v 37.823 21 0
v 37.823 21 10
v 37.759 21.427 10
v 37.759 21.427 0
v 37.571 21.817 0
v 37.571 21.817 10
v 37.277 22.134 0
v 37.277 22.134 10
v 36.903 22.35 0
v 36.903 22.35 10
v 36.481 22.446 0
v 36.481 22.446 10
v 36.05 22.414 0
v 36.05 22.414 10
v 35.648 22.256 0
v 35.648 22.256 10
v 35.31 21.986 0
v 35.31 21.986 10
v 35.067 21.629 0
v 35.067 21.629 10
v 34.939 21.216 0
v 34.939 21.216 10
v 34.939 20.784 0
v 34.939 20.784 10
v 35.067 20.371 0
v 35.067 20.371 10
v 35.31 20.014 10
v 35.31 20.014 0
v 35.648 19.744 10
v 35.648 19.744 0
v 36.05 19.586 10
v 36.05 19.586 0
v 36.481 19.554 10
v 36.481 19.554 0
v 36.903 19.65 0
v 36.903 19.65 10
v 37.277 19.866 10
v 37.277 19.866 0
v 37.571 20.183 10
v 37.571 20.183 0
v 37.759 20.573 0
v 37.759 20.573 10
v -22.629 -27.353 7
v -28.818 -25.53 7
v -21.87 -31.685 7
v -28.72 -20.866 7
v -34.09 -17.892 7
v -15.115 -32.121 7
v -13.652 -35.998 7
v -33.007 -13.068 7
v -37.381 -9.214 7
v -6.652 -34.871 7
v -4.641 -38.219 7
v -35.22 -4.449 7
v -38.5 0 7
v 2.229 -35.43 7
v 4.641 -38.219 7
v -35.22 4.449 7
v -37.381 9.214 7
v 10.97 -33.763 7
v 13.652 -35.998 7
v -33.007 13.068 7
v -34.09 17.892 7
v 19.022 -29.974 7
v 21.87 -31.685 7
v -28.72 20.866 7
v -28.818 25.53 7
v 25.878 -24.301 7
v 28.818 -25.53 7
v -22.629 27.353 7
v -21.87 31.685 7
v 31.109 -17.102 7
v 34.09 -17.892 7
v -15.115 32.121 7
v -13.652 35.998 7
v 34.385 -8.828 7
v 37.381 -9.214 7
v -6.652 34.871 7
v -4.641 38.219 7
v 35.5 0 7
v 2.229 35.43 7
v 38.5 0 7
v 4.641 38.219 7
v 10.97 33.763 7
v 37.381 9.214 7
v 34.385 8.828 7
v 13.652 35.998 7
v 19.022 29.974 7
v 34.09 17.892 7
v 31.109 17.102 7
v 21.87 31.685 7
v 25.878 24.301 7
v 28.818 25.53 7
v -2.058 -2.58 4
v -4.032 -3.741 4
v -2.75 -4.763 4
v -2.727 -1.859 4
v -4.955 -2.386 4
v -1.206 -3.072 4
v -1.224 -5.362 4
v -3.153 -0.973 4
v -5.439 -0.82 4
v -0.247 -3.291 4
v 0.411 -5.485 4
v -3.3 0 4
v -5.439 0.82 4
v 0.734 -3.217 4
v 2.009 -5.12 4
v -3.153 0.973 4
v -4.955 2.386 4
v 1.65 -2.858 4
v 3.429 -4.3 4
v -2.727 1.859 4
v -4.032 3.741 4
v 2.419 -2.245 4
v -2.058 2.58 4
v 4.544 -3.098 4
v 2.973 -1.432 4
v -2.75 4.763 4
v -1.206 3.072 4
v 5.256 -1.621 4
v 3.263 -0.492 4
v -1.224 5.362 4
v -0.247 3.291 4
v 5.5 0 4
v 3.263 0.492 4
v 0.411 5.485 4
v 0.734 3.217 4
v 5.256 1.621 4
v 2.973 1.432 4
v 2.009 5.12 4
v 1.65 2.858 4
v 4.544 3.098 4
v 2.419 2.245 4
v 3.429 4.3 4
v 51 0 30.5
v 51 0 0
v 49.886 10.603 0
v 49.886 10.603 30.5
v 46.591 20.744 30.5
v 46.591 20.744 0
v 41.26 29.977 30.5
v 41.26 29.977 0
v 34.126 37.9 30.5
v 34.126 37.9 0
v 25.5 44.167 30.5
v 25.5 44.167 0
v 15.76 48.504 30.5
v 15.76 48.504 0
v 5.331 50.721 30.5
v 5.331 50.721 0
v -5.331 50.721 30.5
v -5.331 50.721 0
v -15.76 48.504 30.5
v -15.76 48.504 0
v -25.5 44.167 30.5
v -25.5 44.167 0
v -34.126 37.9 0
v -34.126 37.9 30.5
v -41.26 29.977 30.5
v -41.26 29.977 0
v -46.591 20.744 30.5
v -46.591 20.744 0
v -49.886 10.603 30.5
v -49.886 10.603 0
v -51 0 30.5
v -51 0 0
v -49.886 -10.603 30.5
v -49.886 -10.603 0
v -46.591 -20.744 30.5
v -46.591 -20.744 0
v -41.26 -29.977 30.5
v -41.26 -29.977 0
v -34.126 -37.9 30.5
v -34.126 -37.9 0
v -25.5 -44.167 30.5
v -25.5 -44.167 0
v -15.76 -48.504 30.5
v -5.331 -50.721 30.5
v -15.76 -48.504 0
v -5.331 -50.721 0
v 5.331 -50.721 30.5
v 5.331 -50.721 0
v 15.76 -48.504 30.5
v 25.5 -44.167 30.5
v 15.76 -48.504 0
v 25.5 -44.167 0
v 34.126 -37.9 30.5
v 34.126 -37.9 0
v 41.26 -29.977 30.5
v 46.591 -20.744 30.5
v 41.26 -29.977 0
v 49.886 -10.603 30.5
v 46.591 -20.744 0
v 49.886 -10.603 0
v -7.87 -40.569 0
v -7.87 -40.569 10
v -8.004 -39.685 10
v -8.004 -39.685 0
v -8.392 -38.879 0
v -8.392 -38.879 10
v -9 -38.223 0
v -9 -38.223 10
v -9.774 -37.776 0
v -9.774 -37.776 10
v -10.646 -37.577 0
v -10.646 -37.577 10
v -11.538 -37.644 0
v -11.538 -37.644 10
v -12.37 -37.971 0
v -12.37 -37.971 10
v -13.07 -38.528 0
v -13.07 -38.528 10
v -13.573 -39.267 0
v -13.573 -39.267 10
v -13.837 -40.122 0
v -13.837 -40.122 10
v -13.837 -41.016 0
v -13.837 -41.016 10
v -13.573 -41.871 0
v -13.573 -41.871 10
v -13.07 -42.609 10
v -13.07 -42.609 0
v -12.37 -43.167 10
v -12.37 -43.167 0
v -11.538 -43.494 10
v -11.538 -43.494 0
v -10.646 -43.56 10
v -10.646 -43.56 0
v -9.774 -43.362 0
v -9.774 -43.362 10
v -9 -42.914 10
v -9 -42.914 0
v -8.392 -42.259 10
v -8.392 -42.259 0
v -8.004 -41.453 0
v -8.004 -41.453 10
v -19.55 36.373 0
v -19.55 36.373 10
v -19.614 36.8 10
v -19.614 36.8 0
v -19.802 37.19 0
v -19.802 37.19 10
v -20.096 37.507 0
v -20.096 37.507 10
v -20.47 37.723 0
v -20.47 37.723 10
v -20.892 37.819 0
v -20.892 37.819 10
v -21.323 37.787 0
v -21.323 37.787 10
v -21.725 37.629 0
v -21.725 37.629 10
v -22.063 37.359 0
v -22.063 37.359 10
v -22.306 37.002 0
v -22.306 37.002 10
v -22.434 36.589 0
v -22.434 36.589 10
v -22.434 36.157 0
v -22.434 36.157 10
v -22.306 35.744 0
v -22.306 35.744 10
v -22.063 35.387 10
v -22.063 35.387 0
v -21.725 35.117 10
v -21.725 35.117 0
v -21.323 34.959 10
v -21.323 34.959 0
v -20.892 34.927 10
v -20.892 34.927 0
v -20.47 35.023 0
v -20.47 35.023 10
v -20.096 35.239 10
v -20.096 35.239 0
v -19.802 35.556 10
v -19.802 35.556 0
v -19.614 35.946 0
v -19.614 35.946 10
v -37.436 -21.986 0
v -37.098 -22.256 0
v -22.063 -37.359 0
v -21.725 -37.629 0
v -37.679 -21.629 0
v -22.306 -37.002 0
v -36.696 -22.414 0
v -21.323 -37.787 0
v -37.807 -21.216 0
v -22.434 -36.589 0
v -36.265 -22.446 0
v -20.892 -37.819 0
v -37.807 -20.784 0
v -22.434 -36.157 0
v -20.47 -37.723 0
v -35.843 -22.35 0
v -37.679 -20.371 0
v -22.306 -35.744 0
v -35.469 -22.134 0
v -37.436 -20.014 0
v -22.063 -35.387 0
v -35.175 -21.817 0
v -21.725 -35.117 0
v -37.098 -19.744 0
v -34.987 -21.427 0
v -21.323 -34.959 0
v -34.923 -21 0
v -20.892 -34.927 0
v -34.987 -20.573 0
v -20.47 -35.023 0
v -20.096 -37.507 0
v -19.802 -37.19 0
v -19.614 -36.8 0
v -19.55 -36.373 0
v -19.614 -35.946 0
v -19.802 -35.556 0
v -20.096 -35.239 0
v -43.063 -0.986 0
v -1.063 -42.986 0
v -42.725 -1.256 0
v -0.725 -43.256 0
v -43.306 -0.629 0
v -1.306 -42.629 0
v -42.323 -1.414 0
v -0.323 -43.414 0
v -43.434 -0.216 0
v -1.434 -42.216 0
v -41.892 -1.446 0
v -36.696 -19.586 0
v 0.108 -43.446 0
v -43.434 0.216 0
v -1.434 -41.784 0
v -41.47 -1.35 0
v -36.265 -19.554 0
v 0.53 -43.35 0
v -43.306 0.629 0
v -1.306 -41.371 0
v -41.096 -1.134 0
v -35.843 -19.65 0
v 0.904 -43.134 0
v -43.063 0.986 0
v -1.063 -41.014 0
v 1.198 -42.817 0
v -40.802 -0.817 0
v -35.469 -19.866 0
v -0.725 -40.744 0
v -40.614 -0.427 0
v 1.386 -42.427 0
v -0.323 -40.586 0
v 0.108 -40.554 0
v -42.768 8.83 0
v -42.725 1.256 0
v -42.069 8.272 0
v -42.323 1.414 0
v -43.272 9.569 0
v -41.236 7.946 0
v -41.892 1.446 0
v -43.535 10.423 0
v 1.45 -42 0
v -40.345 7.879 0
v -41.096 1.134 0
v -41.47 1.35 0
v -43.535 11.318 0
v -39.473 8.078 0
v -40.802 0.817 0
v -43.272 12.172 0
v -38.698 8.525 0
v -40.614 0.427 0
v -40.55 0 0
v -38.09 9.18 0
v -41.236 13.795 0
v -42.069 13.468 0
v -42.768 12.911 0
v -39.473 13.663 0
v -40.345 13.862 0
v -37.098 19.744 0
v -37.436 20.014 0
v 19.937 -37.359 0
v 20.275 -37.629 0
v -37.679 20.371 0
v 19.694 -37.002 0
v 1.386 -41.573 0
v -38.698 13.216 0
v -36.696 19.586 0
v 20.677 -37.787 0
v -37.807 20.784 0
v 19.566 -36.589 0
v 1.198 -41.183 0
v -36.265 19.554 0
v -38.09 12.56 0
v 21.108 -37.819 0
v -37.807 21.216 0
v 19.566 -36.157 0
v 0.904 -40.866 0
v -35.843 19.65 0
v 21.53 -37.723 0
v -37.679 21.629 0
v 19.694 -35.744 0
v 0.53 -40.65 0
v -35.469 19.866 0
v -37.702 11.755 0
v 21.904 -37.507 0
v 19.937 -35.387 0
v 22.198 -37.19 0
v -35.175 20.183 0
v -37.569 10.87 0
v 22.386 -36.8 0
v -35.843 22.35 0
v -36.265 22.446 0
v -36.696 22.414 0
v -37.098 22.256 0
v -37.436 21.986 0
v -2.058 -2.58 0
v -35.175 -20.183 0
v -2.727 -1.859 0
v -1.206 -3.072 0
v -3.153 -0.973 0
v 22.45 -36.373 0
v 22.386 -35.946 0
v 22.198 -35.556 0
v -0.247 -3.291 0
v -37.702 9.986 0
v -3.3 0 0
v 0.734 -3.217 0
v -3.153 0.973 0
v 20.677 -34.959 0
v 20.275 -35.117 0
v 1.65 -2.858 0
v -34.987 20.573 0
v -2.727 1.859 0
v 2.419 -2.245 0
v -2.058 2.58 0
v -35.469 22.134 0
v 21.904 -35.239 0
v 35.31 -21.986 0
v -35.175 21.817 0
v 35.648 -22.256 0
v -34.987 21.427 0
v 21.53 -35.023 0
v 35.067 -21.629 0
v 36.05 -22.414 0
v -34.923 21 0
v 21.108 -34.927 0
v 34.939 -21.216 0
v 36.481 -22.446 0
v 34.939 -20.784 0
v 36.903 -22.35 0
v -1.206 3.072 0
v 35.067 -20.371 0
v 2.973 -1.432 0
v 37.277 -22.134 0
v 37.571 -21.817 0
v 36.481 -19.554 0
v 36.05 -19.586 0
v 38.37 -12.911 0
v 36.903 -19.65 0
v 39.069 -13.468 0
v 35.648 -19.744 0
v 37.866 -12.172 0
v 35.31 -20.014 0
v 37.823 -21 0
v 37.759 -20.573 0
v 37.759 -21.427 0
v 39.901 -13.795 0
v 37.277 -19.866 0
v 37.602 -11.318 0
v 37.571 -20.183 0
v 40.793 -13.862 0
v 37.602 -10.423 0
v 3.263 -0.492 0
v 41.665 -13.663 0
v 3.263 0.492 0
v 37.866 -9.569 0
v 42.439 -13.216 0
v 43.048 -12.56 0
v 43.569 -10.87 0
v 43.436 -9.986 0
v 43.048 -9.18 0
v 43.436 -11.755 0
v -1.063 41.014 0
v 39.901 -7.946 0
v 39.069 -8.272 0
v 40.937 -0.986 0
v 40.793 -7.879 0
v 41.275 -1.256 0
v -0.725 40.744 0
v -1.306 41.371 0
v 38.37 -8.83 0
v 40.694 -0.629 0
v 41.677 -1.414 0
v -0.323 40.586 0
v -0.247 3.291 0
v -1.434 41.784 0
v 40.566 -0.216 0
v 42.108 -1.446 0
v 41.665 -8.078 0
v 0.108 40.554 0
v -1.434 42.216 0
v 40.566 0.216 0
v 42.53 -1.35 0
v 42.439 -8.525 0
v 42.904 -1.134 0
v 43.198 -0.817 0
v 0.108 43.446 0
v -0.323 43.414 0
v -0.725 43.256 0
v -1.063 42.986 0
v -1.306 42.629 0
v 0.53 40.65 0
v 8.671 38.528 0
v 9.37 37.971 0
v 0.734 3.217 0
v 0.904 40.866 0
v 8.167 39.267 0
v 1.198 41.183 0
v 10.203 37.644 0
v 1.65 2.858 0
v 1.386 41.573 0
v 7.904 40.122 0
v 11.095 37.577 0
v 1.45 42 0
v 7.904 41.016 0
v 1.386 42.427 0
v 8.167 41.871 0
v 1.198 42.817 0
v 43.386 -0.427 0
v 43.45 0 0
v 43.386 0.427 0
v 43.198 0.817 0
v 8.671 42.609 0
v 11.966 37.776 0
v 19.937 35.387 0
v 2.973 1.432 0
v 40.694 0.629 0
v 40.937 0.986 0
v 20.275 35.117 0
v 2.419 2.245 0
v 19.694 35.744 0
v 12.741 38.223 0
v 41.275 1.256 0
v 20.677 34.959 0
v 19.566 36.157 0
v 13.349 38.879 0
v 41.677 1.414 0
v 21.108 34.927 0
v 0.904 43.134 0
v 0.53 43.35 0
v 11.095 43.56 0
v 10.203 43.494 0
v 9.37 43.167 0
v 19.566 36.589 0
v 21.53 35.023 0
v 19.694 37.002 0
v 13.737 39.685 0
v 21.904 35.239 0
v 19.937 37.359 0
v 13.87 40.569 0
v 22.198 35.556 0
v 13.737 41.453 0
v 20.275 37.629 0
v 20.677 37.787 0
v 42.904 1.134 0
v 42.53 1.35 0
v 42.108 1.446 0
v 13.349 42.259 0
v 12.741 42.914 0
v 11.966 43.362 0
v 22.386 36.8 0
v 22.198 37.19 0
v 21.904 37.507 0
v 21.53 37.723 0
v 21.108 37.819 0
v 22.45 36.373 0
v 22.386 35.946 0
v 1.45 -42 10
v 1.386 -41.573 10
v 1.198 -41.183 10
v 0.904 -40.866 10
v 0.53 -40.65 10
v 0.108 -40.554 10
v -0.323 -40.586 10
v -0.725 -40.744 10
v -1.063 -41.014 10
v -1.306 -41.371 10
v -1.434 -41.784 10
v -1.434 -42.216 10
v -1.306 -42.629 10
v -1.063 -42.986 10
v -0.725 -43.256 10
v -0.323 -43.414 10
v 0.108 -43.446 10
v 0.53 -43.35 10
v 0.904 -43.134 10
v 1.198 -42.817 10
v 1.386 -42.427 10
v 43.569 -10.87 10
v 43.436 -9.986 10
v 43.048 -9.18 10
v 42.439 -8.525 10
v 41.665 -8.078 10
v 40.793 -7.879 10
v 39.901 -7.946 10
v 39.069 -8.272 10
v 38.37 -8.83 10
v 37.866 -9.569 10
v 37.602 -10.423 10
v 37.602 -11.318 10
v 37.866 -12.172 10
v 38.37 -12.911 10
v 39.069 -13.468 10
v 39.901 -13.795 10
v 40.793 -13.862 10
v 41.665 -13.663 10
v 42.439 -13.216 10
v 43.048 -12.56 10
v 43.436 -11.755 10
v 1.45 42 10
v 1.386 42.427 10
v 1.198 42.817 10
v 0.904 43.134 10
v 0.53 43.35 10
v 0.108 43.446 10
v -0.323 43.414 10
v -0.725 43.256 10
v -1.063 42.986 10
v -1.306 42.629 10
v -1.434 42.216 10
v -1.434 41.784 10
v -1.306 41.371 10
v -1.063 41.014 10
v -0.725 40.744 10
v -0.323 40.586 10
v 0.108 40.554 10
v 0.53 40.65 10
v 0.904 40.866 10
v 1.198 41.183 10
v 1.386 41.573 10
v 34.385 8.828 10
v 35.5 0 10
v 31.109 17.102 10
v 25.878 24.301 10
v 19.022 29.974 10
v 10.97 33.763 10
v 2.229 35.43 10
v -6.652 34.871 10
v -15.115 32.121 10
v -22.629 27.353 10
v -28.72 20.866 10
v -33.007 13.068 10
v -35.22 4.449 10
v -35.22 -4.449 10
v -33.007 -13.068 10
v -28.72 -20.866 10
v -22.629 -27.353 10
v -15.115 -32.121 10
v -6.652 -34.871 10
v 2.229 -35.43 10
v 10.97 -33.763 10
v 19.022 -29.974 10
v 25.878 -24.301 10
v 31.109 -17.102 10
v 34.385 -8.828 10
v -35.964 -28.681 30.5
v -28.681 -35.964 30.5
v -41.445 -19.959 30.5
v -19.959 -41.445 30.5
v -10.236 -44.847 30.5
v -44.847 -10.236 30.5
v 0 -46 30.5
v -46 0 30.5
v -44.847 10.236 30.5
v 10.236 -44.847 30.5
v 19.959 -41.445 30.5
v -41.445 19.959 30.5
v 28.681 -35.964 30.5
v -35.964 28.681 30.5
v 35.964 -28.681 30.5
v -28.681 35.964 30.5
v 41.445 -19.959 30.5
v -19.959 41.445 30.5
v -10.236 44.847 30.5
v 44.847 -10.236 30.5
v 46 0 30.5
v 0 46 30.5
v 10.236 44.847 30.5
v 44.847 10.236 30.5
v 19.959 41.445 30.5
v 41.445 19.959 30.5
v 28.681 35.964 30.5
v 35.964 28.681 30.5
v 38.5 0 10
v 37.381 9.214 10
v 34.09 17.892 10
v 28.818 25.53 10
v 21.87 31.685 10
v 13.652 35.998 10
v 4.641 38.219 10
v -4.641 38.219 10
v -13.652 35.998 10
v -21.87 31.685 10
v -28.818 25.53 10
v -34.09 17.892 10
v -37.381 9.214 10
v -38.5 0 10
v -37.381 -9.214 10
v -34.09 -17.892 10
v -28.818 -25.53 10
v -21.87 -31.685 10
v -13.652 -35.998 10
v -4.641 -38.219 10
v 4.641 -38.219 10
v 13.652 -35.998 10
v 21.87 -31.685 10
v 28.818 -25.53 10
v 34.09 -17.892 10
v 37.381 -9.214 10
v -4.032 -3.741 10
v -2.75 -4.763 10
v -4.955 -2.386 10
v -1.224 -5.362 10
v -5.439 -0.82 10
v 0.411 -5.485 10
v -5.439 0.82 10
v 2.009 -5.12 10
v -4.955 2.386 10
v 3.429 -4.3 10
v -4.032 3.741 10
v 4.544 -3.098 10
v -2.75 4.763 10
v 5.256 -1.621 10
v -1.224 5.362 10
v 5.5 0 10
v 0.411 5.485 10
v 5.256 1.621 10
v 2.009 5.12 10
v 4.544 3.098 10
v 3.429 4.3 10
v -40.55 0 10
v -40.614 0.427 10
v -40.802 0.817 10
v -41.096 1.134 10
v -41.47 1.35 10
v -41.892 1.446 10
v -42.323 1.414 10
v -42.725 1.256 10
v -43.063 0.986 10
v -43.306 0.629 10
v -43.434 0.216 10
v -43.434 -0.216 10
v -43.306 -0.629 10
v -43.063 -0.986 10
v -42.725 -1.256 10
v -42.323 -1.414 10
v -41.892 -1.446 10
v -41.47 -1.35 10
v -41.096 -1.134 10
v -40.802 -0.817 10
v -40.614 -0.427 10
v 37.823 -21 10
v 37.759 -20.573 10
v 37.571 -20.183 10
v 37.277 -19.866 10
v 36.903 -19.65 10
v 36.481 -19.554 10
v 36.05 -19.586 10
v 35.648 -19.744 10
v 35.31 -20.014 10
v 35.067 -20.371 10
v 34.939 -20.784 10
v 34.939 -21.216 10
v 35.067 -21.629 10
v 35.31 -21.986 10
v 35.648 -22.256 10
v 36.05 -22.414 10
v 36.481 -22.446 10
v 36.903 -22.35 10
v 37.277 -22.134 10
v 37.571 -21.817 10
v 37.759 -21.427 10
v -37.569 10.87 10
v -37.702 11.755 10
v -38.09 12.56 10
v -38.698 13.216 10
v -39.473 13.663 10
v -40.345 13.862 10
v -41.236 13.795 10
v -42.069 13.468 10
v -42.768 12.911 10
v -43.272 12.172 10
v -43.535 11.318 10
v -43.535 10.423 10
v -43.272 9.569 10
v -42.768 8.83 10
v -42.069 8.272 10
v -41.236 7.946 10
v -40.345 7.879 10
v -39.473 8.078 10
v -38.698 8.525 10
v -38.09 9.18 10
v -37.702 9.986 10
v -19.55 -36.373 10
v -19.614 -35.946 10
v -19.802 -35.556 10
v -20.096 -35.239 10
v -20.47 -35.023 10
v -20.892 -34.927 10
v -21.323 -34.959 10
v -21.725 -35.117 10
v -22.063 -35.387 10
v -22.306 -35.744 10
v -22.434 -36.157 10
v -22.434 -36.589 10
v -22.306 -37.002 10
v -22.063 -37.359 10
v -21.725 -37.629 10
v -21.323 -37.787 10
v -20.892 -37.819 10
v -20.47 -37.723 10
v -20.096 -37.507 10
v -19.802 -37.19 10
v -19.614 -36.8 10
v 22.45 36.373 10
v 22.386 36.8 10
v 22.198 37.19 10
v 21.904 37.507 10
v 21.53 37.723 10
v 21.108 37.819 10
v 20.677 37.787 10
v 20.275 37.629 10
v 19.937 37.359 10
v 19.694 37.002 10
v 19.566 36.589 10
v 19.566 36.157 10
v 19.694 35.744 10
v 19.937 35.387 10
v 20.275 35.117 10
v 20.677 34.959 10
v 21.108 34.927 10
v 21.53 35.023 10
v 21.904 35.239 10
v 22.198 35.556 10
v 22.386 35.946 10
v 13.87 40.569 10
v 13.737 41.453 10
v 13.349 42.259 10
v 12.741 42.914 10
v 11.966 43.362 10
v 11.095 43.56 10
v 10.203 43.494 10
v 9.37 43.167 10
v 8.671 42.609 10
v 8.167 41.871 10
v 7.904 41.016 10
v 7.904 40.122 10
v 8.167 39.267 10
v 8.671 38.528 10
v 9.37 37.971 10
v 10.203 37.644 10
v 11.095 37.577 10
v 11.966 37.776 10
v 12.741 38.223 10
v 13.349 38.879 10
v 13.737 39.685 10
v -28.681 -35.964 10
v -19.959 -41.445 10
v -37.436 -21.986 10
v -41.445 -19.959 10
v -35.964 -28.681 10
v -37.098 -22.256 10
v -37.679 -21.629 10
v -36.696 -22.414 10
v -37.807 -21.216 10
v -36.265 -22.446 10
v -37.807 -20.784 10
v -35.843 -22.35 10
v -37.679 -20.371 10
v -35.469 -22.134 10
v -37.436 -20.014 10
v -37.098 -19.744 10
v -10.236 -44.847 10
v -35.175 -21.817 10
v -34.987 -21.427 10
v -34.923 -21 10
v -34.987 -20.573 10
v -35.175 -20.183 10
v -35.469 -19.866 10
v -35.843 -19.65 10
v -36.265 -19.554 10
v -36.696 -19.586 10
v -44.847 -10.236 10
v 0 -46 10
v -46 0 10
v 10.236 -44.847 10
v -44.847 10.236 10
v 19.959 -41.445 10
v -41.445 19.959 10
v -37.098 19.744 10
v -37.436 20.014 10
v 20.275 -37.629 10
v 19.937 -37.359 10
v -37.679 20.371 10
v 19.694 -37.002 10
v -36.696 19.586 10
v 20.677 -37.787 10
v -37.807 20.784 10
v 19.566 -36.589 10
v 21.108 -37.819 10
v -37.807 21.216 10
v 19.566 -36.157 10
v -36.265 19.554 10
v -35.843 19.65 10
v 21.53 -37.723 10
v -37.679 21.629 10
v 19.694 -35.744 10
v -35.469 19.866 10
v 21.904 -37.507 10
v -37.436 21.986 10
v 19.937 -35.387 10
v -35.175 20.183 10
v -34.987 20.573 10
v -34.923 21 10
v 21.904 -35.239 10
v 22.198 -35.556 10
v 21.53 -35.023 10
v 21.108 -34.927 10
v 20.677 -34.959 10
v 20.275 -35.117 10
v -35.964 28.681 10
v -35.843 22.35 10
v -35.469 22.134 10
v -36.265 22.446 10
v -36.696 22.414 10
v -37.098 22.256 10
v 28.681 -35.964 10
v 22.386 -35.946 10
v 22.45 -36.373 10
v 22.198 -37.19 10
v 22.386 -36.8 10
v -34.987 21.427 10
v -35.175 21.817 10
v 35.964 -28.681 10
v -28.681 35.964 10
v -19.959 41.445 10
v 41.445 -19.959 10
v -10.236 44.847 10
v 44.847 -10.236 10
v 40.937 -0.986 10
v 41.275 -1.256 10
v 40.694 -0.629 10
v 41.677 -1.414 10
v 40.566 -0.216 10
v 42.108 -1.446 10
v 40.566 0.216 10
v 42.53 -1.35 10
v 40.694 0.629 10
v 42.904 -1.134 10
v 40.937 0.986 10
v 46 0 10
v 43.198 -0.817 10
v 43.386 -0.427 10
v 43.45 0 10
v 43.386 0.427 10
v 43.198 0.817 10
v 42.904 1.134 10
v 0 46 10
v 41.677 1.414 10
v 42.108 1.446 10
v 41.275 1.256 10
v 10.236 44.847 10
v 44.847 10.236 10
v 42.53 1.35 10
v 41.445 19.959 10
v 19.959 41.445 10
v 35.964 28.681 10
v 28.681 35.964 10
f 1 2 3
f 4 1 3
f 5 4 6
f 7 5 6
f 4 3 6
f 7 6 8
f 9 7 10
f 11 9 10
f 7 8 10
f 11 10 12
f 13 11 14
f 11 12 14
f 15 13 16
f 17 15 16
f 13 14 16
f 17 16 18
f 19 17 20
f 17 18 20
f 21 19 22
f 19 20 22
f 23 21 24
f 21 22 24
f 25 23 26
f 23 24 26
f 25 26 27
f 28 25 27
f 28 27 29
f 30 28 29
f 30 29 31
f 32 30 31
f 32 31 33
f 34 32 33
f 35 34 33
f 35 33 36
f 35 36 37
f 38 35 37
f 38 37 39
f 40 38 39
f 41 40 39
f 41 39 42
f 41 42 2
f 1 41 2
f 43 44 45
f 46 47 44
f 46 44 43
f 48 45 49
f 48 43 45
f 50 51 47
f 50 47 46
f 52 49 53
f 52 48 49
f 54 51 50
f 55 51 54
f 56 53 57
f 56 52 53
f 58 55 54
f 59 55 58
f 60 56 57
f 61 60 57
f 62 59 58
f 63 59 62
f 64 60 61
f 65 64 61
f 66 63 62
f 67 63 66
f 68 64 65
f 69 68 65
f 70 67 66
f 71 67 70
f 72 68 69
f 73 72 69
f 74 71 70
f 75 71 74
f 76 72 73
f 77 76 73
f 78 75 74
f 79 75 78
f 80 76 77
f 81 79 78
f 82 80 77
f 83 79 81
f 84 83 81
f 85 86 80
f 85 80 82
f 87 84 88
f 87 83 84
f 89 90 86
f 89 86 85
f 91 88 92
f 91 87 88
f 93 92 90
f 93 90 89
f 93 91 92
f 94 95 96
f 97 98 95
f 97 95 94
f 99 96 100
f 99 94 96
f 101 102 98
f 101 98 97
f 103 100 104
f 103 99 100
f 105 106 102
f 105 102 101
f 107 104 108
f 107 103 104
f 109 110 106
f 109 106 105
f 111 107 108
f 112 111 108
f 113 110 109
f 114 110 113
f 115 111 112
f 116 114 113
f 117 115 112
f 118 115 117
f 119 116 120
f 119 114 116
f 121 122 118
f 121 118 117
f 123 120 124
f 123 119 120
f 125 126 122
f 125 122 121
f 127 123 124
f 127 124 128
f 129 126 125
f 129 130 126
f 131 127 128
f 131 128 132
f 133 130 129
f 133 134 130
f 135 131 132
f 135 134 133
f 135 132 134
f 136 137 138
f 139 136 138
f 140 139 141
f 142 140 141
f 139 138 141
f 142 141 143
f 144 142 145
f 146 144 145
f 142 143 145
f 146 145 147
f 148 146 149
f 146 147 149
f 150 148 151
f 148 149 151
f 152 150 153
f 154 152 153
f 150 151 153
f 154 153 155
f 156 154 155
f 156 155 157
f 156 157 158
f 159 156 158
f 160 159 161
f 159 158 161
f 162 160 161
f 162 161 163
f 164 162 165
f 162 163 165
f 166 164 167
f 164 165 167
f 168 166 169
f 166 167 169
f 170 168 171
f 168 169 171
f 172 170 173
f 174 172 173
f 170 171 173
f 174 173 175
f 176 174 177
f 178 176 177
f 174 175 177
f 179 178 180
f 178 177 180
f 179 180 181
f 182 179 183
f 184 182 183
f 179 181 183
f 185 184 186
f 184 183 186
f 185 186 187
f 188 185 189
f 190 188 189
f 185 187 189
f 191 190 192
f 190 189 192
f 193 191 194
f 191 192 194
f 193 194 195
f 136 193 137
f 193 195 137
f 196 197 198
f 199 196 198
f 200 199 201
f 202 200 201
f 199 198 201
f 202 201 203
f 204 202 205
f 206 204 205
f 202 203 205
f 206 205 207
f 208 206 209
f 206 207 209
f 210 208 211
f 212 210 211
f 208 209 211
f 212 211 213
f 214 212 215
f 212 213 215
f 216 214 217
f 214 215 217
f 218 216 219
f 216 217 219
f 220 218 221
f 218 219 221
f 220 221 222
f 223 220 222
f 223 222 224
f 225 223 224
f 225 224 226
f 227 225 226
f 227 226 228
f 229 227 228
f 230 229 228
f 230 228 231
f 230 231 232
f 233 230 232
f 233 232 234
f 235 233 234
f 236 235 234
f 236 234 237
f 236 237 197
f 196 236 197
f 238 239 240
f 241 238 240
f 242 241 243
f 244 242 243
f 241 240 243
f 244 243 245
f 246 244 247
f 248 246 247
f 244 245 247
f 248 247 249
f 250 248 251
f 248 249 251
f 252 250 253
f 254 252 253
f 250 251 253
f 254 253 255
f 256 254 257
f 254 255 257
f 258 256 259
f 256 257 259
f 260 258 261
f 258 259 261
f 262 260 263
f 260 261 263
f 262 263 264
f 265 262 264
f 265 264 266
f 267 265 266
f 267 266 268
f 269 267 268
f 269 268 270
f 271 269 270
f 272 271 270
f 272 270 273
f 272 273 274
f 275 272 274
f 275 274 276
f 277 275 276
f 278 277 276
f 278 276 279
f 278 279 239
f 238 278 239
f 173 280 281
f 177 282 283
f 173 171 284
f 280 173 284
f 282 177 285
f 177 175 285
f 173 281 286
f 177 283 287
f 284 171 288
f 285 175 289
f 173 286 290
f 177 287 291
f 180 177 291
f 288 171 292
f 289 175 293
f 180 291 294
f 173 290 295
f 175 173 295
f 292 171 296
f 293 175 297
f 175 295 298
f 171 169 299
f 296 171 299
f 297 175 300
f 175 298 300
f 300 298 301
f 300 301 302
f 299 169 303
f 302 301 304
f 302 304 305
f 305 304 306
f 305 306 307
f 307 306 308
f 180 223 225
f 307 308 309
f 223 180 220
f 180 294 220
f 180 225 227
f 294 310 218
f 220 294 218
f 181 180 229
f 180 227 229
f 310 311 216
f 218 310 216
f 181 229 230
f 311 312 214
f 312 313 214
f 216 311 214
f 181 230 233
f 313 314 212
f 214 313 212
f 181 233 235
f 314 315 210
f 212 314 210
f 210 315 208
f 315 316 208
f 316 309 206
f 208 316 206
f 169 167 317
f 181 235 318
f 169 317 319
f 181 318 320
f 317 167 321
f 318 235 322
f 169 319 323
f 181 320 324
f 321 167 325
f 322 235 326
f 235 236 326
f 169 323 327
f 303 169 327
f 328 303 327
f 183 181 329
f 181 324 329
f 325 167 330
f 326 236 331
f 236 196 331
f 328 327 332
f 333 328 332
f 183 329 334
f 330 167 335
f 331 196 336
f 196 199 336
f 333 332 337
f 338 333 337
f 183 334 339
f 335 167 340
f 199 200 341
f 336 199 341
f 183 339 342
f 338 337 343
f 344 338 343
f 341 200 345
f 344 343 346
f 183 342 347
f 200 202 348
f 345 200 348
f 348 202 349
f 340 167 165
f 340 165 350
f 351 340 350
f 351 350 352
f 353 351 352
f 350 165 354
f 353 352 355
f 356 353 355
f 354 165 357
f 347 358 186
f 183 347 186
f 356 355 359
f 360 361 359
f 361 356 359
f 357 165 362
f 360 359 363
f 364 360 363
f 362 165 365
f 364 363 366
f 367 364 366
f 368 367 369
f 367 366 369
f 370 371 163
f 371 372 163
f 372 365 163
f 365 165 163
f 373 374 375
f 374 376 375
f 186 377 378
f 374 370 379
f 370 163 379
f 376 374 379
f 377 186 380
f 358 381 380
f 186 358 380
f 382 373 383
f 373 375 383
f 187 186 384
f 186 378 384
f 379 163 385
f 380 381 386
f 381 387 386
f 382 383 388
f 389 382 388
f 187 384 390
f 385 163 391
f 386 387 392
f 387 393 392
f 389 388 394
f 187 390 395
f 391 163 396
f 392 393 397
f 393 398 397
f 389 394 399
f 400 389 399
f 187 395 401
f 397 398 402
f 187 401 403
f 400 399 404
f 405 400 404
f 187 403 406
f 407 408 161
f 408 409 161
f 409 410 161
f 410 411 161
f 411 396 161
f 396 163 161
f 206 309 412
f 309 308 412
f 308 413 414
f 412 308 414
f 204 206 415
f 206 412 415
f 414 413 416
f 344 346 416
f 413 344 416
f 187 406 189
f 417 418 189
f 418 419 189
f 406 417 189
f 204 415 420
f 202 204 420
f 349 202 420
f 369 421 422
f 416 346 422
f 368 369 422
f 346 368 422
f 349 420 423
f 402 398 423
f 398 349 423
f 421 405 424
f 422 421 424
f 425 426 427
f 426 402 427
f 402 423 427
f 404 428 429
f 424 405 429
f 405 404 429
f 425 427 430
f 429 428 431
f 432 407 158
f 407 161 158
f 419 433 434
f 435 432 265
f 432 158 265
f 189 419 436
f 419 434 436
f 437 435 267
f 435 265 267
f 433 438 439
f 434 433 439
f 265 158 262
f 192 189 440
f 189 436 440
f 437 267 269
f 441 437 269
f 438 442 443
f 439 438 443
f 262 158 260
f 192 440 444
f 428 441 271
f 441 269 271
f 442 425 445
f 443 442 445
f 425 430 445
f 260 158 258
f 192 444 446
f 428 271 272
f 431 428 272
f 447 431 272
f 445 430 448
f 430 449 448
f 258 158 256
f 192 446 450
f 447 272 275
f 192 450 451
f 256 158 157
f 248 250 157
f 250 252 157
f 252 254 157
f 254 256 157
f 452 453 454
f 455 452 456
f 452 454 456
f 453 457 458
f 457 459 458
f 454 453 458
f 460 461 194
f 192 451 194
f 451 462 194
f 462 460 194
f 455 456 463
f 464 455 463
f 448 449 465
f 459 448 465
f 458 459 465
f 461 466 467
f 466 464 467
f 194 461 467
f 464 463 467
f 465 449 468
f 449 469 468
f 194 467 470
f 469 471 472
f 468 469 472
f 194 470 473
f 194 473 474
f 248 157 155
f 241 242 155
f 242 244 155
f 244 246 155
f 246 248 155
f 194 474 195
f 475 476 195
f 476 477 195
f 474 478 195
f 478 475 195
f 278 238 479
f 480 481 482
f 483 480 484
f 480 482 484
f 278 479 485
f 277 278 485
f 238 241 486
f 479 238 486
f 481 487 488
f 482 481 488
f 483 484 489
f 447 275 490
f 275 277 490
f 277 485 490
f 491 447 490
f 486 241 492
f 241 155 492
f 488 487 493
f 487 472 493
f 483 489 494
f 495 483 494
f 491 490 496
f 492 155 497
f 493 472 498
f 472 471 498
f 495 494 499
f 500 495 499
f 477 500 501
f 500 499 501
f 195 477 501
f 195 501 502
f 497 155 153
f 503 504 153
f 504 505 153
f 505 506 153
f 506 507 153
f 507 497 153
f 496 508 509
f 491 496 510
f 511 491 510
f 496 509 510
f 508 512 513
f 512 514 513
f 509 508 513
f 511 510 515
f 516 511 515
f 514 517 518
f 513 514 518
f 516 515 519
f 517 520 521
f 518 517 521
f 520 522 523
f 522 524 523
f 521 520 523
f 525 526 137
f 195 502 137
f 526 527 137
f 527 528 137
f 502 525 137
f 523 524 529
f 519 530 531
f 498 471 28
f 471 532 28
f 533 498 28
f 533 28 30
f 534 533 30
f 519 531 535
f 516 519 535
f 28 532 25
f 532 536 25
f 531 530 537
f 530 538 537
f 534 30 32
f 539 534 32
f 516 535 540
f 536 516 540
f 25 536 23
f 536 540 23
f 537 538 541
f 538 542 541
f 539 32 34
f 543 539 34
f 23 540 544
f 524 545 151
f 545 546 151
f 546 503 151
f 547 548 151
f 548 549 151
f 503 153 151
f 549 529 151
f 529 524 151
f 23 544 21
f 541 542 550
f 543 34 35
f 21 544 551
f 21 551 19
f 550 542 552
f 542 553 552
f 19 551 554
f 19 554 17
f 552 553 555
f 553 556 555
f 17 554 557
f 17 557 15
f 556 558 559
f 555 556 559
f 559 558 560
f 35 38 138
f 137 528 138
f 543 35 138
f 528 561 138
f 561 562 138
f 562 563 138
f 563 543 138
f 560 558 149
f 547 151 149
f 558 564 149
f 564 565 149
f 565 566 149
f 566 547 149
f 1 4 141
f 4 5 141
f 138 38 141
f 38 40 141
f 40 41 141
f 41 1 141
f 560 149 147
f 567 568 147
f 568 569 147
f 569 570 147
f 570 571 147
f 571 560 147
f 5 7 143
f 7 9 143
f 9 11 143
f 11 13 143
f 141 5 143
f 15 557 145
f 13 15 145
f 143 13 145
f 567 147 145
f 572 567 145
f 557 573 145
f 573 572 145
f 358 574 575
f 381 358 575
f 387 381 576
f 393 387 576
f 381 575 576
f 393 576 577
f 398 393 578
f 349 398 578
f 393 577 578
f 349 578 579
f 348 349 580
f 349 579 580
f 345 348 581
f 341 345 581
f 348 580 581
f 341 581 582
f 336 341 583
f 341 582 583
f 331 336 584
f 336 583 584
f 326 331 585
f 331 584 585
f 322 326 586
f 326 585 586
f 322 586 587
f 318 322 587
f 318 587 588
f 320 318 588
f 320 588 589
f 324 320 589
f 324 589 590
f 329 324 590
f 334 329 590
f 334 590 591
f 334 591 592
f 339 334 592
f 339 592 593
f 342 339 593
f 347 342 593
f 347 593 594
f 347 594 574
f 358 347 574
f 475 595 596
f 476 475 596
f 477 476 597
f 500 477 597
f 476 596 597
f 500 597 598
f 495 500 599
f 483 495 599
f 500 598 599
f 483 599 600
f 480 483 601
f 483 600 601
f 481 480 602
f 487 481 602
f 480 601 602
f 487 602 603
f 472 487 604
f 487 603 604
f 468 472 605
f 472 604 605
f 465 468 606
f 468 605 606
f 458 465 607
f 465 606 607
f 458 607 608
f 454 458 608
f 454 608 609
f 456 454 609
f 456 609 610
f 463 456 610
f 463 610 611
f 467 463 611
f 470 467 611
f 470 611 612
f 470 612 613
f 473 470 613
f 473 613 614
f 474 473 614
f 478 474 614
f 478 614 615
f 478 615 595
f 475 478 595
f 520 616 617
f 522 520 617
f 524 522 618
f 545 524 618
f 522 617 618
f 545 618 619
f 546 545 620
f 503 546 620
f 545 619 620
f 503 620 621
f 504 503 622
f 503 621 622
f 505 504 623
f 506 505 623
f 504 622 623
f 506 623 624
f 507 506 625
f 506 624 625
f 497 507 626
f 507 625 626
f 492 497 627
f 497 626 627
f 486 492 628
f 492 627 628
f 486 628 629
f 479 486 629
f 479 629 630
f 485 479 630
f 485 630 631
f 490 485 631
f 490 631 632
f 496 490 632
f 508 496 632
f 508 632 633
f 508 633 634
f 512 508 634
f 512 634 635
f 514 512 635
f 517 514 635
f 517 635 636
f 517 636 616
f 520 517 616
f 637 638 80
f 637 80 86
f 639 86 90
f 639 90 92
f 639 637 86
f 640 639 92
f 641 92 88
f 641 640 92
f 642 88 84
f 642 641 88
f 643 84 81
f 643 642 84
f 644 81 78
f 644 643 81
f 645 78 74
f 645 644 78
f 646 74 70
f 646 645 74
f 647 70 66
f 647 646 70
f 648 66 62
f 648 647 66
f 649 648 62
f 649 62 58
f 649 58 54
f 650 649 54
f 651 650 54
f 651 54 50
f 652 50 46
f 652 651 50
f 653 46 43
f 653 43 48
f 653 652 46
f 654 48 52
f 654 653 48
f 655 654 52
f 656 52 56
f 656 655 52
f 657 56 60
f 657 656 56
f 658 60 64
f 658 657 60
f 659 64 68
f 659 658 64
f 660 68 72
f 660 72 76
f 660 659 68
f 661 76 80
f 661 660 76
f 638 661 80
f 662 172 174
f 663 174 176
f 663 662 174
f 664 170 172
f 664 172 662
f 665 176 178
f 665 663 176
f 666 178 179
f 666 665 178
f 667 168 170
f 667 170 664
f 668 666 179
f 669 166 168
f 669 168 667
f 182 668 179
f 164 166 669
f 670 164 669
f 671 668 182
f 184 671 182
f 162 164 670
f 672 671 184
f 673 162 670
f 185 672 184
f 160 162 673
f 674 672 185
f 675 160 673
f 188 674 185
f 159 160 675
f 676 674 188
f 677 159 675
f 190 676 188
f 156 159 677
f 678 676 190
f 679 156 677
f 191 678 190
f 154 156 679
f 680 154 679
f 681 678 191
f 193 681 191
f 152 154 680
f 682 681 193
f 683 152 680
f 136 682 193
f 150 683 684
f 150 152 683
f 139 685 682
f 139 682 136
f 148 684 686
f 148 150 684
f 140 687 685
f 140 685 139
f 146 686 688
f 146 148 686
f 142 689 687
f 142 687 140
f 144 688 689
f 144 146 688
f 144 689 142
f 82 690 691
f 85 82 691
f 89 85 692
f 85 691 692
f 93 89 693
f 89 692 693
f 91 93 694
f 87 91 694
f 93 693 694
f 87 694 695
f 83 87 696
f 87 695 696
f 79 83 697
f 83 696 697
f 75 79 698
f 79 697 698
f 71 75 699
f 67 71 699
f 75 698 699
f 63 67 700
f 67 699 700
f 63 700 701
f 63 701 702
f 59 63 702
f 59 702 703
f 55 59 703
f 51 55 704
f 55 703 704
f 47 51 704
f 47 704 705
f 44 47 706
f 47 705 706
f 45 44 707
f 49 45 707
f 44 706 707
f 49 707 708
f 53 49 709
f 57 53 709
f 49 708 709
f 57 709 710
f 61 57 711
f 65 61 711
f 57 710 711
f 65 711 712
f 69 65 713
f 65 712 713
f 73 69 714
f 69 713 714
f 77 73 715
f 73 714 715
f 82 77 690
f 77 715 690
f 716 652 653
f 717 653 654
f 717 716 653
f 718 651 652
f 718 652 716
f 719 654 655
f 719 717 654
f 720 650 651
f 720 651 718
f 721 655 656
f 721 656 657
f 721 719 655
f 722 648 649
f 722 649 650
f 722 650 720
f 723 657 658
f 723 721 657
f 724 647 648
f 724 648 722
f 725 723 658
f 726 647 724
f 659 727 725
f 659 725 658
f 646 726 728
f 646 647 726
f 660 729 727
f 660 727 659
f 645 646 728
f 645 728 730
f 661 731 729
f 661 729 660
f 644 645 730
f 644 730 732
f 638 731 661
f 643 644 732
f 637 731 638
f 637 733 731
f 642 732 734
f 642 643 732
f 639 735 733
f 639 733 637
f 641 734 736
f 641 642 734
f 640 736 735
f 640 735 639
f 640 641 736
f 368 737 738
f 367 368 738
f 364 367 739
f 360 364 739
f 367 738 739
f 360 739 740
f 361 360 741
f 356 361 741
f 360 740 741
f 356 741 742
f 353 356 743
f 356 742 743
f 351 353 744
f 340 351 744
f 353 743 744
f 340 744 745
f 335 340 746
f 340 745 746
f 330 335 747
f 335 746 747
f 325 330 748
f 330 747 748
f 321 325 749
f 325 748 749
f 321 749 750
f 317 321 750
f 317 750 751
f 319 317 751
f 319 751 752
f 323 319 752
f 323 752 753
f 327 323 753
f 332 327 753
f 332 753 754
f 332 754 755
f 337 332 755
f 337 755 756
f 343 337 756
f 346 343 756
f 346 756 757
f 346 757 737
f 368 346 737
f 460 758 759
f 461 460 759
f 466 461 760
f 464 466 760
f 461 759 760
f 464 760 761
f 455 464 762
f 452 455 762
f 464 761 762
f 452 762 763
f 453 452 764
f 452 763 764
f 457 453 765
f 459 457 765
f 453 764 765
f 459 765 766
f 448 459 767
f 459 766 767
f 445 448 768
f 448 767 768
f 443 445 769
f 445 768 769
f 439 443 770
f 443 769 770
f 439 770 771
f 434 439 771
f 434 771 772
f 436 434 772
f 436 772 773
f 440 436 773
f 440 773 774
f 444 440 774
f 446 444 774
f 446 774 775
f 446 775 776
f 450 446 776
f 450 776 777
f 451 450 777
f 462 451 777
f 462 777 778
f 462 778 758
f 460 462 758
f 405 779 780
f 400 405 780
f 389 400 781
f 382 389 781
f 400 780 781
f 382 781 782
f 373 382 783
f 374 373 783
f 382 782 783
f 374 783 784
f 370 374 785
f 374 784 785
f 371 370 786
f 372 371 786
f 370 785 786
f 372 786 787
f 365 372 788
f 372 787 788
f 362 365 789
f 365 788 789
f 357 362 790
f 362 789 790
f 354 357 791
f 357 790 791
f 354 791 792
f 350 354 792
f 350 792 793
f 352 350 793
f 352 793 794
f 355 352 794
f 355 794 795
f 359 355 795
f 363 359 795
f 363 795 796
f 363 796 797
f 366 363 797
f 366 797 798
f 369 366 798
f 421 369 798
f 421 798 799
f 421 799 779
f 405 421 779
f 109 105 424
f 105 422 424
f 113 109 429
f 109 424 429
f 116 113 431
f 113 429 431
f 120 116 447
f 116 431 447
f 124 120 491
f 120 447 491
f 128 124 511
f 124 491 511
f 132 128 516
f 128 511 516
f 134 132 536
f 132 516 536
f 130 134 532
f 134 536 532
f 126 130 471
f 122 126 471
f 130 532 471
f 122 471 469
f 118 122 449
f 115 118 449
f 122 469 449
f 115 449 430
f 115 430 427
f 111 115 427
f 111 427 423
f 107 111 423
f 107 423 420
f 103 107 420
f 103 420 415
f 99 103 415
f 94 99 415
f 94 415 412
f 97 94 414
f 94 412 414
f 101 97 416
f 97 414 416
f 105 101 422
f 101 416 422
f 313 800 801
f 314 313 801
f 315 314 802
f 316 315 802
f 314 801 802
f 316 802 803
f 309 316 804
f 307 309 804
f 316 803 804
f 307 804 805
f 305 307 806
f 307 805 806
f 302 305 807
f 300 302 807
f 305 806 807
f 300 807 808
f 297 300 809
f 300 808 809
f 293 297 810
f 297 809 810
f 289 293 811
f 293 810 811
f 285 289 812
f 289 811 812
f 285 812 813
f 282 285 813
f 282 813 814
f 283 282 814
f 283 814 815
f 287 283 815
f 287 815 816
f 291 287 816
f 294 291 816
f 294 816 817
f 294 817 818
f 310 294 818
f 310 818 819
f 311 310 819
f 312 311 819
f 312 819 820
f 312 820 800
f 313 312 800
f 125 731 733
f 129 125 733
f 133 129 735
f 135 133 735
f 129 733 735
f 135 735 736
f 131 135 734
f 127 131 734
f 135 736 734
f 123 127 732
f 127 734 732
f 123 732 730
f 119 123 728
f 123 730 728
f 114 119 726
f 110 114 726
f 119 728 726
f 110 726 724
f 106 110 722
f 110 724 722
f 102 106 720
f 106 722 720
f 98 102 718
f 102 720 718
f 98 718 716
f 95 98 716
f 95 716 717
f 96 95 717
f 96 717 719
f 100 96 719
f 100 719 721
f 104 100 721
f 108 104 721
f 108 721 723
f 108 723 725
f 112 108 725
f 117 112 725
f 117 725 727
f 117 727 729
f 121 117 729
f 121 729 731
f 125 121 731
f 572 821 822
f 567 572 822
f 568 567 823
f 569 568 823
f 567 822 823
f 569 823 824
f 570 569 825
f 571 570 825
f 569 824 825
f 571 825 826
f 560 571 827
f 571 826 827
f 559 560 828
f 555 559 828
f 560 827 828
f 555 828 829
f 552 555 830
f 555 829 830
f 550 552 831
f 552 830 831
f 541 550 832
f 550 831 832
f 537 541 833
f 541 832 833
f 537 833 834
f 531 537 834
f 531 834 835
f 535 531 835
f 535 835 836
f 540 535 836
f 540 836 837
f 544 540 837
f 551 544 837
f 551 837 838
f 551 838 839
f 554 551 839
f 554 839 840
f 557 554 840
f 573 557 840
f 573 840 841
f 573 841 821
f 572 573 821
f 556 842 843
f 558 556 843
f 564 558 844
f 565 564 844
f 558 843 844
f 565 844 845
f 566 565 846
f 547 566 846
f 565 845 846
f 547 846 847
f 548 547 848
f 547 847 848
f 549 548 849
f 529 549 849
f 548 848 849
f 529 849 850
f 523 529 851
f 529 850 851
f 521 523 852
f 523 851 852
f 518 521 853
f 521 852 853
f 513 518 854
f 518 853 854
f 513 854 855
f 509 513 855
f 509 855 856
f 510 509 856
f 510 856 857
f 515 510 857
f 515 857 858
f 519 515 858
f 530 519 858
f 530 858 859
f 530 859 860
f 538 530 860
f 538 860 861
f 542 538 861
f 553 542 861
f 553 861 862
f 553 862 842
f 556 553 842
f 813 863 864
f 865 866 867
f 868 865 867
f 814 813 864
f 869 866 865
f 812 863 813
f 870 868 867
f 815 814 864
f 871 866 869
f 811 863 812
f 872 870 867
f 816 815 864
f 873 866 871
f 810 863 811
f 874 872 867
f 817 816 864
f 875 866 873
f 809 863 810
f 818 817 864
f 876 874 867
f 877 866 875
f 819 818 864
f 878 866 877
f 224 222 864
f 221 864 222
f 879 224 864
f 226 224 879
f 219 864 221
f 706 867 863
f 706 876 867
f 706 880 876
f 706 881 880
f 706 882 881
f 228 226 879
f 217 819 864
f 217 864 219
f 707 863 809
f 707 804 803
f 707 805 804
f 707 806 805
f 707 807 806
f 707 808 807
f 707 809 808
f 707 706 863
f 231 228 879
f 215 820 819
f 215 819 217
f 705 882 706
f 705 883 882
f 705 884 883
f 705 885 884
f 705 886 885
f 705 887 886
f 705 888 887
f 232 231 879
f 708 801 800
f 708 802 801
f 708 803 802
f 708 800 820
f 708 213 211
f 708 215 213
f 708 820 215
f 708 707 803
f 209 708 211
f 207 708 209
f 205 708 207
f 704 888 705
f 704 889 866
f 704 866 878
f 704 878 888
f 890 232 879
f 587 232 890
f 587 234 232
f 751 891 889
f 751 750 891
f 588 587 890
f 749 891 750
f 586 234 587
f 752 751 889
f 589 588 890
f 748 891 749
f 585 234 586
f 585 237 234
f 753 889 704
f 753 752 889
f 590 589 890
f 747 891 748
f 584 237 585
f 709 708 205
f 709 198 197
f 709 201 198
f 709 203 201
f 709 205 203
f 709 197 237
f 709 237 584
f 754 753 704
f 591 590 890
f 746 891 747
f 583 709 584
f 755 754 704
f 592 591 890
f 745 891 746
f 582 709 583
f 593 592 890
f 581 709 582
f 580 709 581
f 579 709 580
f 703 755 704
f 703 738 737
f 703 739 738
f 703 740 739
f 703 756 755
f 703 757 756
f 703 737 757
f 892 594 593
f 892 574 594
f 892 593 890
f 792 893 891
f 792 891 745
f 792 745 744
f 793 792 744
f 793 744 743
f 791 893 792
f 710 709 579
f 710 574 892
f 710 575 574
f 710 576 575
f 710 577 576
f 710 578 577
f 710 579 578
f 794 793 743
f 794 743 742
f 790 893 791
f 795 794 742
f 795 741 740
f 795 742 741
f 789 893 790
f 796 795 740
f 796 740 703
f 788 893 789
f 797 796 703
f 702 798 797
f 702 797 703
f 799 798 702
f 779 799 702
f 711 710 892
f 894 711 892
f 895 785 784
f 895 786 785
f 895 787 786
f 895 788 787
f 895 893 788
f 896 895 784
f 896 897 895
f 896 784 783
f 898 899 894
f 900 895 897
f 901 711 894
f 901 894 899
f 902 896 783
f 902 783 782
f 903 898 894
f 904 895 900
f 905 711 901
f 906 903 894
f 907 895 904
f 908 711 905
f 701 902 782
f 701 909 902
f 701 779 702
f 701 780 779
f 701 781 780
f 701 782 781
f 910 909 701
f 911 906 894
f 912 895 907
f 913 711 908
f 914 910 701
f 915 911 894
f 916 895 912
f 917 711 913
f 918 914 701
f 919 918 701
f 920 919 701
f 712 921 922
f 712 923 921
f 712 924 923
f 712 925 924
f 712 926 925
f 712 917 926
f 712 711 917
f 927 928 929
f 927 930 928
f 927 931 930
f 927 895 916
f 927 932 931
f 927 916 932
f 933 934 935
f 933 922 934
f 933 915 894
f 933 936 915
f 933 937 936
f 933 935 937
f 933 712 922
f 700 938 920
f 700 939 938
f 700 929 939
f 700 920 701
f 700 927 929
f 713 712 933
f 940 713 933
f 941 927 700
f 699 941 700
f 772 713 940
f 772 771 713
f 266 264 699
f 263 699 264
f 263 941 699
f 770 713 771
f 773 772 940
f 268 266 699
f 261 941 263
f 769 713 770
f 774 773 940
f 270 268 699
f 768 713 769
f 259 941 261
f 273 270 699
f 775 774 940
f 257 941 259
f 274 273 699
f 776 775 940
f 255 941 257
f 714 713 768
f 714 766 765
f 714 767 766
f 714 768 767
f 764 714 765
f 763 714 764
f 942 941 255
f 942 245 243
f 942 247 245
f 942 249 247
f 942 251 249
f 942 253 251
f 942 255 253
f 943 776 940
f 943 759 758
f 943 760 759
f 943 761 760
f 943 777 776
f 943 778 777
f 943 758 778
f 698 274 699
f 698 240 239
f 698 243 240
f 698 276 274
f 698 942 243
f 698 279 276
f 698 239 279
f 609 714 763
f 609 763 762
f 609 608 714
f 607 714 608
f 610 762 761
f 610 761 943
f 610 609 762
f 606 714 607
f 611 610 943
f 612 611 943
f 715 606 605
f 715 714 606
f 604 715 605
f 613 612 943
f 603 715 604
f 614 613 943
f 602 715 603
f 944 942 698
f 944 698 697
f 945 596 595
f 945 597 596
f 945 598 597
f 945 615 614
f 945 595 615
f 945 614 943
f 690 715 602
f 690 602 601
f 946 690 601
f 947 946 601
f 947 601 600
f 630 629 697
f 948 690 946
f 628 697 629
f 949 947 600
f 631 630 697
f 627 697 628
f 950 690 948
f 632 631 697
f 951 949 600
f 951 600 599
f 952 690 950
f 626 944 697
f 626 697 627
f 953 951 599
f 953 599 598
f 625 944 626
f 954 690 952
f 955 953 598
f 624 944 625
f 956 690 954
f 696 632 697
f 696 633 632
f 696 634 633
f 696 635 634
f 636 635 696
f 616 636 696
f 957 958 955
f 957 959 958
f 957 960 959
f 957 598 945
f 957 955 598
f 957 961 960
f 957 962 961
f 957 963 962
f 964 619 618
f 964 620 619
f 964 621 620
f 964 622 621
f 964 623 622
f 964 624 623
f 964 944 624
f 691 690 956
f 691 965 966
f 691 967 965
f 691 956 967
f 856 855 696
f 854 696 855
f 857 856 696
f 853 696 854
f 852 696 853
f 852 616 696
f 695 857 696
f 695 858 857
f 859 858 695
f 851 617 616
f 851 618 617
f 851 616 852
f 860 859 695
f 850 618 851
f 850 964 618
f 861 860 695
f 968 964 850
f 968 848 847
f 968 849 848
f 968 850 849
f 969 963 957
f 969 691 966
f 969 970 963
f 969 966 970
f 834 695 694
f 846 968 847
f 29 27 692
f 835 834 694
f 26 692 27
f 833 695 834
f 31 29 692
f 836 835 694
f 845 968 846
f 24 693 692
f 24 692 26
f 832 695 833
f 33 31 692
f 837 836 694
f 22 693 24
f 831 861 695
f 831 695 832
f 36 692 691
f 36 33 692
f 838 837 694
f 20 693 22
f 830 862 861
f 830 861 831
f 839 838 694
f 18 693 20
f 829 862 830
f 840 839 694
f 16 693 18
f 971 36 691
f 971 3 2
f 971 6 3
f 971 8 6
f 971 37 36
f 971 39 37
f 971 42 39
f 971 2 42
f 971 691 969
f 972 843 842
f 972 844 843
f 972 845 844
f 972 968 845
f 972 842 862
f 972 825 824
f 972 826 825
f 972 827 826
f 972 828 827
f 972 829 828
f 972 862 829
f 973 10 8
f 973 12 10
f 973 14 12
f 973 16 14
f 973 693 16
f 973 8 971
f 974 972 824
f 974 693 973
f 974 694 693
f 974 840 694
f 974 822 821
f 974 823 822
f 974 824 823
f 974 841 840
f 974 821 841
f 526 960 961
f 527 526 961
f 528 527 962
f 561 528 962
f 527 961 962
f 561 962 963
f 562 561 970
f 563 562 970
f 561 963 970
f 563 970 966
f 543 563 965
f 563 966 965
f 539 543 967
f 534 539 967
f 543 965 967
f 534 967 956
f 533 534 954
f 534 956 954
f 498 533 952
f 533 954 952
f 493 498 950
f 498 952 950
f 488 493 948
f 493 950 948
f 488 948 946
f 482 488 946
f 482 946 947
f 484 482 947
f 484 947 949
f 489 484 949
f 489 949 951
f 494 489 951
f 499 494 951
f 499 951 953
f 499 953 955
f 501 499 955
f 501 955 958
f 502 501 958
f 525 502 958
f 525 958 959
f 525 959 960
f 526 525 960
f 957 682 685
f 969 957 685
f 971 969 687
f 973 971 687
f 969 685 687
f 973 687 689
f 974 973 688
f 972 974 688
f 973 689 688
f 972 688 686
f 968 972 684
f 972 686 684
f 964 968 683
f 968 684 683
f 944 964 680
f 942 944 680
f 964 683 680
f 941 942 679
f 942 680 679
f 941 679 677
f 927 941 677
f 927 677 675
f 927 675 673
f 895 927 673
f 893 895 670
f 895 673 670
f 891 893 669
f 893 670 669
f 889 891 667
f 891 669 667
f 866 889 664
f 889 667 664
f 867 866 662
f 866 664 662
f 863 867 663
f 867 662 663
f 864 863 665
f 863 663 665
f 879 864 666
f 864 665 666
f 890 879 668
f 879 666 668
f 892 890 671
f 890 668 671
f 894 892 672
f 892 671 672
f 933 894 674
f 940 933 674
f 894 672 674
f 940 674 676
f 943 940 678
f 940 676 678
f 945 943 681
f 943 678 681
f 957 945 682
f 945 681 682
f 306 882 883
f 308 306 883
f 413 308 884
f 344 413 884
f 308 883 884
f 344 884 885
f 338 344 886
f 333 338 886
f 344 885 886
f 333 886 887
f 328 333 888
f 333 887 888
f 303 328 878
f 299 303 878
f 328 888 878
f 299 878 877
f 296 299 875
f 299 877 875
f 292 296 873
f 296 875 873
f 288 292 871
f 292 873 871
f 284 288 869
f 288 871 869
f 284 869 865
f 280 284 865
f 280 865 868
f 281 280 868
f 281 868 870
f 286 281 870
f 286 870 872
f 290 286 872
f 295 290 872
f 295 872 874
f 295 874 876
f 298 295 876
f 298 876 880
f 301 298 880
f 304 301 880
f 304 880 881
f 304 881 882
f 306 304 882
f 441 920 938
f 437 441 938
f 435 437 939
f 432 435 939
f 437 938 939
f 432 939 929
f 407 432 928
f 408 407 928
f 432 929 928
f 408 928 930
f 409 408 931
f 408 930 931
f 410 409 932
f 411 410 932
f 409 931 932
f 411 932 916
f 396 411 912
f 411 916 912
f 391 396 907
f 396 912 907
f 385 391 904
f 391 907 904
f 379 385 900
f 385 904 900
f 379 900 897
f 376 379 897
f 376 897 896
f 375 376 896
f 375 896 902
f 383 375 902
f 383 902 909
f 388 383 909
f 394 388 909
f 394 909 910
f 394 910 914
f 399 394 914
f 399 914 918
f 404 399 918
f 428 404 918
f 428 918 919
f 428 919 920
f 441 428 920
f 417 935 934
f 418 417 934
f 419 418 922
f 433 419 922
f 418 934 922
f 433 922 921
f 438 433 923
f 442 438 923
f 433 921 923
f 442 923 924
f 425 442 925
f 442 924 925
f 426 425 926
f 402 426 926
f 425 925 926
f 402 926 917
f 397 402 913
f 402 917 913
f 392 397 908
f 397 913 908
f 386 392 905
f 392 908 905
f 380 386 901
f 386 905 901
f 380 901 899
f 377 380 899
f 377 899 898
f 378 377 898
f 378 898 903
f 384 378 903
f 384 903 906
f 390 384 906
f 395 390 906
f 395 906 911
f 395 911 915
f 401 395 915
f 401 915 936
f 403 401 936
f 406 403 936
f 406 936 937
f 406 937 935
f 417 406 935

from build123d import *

# Parameters (mm, degrees)
SKETCH2_R                                       = 51
BOSS_EXTRUDE1_DEPTH                             = 30.5
SKETCH3_R                                       = 46
CUT_EXTRUDE1_DEPTH                              = 20.5
M3_5X0_6_TAPPED_HOLE1_D                         = 2.9
F_6_0MM_DOWEL_HOLE1_D                           = 6
SKETCH10_R                                      = 38.5
SKETCH10_R_2                                    = 35.5
CUT_EXTRUDE2_DEPTH                              = 3
CBORE_FOR_M6_SOCKET_HEAD_CAP_SCREW1_D           = 6.6
CBORE_FOR_M6_SOCKET_HEAD_CAP_SCREW1_CBORE_D     = 11
CBORE_FOR_M6_SOCKET_HEAD_CAP_SCREW1_CBORE_DEPTH = 6


with BuildPart() as part:
    # Sketch2 → Boss-Extrude1 (new body)
    with BuildSketch(Plane.XY):
        Circle(SKETCH2_R)
    extrude(amount=BOSS_EXTRUDE1_DEPTH)

    # Sketch3 → Cut-Extrude1 (cut)
    with BuildSketch(Plane.XY.offset(30.5)):
        Circle(SKETCH3_R)
    extrude(amount=-CUT_EXTRUDE1_DEPTH, mode=Mode.SUBTRACT)

    # M3.5x0.6 Tapped Hole1 (through all)
    with Locations(Plane(origin=(0, 0, 0), x_dir=(-1, 0, 0), z_dir=(0, 0, -1))):
        with Locations((21, 36.373066959), (36.373066959, 21), (42, 0), (36.373066959, -21), (21, -36.373066959), (0, -42), (-21, -36.373066959), (-36.373066959, -21), (-42, 0), (-36.373066959, 21), (-21, 36.373066959), (0, 42)):
            Hole(M3_5X0_6_TAPPED_HOLE1_D / 2)

    # Ø6.0mm Dowel Hole1 (through all)
    with Locations(Plane(origin=(0, 0, 0), x_dir=(-1, 0, 0), z_dir=(0, 0, -1))):
        with Locations((-10.870399894, 40.568884704), (40.568884704, 10.870399894), (10.870399894, -40.568884704), (-40.568884704, -10.870399894)):
            Hole(F_6_0MM_DOWEL_HOLE1_D / 2)

    # Sketch10 → Cut-Extrude2 (cut)
    with BuildSketch(Plane.XY.offset(10)):
        Circle(SKETCH10_R)
        Circle(SKETCH10_R_2, mode=Mode.SUBTRACT)
    extrude(amount=-CUT_EXTRUDE2_DEPTH, mode=Mode.SUBTRACT)

    # CBORE for M6 Socket Head Cap Screw1 (through all)
    with Locations(Plane.XY.offset(10)):
        with Locations((0, 0)):
            CounterBoreHole(CBORE_FOR_M6_SOCKET_HEAD_CAP_SCREW1_D / 2, CBORE_FOR_M6_SOCKET_HEAD_CAP_SCREW1_CBORE_D / 2, CBORE_FOR_M6_SOCKET_HEAD_CAP_SCREW1_CBORE_DEPTH)


solid = part.part
